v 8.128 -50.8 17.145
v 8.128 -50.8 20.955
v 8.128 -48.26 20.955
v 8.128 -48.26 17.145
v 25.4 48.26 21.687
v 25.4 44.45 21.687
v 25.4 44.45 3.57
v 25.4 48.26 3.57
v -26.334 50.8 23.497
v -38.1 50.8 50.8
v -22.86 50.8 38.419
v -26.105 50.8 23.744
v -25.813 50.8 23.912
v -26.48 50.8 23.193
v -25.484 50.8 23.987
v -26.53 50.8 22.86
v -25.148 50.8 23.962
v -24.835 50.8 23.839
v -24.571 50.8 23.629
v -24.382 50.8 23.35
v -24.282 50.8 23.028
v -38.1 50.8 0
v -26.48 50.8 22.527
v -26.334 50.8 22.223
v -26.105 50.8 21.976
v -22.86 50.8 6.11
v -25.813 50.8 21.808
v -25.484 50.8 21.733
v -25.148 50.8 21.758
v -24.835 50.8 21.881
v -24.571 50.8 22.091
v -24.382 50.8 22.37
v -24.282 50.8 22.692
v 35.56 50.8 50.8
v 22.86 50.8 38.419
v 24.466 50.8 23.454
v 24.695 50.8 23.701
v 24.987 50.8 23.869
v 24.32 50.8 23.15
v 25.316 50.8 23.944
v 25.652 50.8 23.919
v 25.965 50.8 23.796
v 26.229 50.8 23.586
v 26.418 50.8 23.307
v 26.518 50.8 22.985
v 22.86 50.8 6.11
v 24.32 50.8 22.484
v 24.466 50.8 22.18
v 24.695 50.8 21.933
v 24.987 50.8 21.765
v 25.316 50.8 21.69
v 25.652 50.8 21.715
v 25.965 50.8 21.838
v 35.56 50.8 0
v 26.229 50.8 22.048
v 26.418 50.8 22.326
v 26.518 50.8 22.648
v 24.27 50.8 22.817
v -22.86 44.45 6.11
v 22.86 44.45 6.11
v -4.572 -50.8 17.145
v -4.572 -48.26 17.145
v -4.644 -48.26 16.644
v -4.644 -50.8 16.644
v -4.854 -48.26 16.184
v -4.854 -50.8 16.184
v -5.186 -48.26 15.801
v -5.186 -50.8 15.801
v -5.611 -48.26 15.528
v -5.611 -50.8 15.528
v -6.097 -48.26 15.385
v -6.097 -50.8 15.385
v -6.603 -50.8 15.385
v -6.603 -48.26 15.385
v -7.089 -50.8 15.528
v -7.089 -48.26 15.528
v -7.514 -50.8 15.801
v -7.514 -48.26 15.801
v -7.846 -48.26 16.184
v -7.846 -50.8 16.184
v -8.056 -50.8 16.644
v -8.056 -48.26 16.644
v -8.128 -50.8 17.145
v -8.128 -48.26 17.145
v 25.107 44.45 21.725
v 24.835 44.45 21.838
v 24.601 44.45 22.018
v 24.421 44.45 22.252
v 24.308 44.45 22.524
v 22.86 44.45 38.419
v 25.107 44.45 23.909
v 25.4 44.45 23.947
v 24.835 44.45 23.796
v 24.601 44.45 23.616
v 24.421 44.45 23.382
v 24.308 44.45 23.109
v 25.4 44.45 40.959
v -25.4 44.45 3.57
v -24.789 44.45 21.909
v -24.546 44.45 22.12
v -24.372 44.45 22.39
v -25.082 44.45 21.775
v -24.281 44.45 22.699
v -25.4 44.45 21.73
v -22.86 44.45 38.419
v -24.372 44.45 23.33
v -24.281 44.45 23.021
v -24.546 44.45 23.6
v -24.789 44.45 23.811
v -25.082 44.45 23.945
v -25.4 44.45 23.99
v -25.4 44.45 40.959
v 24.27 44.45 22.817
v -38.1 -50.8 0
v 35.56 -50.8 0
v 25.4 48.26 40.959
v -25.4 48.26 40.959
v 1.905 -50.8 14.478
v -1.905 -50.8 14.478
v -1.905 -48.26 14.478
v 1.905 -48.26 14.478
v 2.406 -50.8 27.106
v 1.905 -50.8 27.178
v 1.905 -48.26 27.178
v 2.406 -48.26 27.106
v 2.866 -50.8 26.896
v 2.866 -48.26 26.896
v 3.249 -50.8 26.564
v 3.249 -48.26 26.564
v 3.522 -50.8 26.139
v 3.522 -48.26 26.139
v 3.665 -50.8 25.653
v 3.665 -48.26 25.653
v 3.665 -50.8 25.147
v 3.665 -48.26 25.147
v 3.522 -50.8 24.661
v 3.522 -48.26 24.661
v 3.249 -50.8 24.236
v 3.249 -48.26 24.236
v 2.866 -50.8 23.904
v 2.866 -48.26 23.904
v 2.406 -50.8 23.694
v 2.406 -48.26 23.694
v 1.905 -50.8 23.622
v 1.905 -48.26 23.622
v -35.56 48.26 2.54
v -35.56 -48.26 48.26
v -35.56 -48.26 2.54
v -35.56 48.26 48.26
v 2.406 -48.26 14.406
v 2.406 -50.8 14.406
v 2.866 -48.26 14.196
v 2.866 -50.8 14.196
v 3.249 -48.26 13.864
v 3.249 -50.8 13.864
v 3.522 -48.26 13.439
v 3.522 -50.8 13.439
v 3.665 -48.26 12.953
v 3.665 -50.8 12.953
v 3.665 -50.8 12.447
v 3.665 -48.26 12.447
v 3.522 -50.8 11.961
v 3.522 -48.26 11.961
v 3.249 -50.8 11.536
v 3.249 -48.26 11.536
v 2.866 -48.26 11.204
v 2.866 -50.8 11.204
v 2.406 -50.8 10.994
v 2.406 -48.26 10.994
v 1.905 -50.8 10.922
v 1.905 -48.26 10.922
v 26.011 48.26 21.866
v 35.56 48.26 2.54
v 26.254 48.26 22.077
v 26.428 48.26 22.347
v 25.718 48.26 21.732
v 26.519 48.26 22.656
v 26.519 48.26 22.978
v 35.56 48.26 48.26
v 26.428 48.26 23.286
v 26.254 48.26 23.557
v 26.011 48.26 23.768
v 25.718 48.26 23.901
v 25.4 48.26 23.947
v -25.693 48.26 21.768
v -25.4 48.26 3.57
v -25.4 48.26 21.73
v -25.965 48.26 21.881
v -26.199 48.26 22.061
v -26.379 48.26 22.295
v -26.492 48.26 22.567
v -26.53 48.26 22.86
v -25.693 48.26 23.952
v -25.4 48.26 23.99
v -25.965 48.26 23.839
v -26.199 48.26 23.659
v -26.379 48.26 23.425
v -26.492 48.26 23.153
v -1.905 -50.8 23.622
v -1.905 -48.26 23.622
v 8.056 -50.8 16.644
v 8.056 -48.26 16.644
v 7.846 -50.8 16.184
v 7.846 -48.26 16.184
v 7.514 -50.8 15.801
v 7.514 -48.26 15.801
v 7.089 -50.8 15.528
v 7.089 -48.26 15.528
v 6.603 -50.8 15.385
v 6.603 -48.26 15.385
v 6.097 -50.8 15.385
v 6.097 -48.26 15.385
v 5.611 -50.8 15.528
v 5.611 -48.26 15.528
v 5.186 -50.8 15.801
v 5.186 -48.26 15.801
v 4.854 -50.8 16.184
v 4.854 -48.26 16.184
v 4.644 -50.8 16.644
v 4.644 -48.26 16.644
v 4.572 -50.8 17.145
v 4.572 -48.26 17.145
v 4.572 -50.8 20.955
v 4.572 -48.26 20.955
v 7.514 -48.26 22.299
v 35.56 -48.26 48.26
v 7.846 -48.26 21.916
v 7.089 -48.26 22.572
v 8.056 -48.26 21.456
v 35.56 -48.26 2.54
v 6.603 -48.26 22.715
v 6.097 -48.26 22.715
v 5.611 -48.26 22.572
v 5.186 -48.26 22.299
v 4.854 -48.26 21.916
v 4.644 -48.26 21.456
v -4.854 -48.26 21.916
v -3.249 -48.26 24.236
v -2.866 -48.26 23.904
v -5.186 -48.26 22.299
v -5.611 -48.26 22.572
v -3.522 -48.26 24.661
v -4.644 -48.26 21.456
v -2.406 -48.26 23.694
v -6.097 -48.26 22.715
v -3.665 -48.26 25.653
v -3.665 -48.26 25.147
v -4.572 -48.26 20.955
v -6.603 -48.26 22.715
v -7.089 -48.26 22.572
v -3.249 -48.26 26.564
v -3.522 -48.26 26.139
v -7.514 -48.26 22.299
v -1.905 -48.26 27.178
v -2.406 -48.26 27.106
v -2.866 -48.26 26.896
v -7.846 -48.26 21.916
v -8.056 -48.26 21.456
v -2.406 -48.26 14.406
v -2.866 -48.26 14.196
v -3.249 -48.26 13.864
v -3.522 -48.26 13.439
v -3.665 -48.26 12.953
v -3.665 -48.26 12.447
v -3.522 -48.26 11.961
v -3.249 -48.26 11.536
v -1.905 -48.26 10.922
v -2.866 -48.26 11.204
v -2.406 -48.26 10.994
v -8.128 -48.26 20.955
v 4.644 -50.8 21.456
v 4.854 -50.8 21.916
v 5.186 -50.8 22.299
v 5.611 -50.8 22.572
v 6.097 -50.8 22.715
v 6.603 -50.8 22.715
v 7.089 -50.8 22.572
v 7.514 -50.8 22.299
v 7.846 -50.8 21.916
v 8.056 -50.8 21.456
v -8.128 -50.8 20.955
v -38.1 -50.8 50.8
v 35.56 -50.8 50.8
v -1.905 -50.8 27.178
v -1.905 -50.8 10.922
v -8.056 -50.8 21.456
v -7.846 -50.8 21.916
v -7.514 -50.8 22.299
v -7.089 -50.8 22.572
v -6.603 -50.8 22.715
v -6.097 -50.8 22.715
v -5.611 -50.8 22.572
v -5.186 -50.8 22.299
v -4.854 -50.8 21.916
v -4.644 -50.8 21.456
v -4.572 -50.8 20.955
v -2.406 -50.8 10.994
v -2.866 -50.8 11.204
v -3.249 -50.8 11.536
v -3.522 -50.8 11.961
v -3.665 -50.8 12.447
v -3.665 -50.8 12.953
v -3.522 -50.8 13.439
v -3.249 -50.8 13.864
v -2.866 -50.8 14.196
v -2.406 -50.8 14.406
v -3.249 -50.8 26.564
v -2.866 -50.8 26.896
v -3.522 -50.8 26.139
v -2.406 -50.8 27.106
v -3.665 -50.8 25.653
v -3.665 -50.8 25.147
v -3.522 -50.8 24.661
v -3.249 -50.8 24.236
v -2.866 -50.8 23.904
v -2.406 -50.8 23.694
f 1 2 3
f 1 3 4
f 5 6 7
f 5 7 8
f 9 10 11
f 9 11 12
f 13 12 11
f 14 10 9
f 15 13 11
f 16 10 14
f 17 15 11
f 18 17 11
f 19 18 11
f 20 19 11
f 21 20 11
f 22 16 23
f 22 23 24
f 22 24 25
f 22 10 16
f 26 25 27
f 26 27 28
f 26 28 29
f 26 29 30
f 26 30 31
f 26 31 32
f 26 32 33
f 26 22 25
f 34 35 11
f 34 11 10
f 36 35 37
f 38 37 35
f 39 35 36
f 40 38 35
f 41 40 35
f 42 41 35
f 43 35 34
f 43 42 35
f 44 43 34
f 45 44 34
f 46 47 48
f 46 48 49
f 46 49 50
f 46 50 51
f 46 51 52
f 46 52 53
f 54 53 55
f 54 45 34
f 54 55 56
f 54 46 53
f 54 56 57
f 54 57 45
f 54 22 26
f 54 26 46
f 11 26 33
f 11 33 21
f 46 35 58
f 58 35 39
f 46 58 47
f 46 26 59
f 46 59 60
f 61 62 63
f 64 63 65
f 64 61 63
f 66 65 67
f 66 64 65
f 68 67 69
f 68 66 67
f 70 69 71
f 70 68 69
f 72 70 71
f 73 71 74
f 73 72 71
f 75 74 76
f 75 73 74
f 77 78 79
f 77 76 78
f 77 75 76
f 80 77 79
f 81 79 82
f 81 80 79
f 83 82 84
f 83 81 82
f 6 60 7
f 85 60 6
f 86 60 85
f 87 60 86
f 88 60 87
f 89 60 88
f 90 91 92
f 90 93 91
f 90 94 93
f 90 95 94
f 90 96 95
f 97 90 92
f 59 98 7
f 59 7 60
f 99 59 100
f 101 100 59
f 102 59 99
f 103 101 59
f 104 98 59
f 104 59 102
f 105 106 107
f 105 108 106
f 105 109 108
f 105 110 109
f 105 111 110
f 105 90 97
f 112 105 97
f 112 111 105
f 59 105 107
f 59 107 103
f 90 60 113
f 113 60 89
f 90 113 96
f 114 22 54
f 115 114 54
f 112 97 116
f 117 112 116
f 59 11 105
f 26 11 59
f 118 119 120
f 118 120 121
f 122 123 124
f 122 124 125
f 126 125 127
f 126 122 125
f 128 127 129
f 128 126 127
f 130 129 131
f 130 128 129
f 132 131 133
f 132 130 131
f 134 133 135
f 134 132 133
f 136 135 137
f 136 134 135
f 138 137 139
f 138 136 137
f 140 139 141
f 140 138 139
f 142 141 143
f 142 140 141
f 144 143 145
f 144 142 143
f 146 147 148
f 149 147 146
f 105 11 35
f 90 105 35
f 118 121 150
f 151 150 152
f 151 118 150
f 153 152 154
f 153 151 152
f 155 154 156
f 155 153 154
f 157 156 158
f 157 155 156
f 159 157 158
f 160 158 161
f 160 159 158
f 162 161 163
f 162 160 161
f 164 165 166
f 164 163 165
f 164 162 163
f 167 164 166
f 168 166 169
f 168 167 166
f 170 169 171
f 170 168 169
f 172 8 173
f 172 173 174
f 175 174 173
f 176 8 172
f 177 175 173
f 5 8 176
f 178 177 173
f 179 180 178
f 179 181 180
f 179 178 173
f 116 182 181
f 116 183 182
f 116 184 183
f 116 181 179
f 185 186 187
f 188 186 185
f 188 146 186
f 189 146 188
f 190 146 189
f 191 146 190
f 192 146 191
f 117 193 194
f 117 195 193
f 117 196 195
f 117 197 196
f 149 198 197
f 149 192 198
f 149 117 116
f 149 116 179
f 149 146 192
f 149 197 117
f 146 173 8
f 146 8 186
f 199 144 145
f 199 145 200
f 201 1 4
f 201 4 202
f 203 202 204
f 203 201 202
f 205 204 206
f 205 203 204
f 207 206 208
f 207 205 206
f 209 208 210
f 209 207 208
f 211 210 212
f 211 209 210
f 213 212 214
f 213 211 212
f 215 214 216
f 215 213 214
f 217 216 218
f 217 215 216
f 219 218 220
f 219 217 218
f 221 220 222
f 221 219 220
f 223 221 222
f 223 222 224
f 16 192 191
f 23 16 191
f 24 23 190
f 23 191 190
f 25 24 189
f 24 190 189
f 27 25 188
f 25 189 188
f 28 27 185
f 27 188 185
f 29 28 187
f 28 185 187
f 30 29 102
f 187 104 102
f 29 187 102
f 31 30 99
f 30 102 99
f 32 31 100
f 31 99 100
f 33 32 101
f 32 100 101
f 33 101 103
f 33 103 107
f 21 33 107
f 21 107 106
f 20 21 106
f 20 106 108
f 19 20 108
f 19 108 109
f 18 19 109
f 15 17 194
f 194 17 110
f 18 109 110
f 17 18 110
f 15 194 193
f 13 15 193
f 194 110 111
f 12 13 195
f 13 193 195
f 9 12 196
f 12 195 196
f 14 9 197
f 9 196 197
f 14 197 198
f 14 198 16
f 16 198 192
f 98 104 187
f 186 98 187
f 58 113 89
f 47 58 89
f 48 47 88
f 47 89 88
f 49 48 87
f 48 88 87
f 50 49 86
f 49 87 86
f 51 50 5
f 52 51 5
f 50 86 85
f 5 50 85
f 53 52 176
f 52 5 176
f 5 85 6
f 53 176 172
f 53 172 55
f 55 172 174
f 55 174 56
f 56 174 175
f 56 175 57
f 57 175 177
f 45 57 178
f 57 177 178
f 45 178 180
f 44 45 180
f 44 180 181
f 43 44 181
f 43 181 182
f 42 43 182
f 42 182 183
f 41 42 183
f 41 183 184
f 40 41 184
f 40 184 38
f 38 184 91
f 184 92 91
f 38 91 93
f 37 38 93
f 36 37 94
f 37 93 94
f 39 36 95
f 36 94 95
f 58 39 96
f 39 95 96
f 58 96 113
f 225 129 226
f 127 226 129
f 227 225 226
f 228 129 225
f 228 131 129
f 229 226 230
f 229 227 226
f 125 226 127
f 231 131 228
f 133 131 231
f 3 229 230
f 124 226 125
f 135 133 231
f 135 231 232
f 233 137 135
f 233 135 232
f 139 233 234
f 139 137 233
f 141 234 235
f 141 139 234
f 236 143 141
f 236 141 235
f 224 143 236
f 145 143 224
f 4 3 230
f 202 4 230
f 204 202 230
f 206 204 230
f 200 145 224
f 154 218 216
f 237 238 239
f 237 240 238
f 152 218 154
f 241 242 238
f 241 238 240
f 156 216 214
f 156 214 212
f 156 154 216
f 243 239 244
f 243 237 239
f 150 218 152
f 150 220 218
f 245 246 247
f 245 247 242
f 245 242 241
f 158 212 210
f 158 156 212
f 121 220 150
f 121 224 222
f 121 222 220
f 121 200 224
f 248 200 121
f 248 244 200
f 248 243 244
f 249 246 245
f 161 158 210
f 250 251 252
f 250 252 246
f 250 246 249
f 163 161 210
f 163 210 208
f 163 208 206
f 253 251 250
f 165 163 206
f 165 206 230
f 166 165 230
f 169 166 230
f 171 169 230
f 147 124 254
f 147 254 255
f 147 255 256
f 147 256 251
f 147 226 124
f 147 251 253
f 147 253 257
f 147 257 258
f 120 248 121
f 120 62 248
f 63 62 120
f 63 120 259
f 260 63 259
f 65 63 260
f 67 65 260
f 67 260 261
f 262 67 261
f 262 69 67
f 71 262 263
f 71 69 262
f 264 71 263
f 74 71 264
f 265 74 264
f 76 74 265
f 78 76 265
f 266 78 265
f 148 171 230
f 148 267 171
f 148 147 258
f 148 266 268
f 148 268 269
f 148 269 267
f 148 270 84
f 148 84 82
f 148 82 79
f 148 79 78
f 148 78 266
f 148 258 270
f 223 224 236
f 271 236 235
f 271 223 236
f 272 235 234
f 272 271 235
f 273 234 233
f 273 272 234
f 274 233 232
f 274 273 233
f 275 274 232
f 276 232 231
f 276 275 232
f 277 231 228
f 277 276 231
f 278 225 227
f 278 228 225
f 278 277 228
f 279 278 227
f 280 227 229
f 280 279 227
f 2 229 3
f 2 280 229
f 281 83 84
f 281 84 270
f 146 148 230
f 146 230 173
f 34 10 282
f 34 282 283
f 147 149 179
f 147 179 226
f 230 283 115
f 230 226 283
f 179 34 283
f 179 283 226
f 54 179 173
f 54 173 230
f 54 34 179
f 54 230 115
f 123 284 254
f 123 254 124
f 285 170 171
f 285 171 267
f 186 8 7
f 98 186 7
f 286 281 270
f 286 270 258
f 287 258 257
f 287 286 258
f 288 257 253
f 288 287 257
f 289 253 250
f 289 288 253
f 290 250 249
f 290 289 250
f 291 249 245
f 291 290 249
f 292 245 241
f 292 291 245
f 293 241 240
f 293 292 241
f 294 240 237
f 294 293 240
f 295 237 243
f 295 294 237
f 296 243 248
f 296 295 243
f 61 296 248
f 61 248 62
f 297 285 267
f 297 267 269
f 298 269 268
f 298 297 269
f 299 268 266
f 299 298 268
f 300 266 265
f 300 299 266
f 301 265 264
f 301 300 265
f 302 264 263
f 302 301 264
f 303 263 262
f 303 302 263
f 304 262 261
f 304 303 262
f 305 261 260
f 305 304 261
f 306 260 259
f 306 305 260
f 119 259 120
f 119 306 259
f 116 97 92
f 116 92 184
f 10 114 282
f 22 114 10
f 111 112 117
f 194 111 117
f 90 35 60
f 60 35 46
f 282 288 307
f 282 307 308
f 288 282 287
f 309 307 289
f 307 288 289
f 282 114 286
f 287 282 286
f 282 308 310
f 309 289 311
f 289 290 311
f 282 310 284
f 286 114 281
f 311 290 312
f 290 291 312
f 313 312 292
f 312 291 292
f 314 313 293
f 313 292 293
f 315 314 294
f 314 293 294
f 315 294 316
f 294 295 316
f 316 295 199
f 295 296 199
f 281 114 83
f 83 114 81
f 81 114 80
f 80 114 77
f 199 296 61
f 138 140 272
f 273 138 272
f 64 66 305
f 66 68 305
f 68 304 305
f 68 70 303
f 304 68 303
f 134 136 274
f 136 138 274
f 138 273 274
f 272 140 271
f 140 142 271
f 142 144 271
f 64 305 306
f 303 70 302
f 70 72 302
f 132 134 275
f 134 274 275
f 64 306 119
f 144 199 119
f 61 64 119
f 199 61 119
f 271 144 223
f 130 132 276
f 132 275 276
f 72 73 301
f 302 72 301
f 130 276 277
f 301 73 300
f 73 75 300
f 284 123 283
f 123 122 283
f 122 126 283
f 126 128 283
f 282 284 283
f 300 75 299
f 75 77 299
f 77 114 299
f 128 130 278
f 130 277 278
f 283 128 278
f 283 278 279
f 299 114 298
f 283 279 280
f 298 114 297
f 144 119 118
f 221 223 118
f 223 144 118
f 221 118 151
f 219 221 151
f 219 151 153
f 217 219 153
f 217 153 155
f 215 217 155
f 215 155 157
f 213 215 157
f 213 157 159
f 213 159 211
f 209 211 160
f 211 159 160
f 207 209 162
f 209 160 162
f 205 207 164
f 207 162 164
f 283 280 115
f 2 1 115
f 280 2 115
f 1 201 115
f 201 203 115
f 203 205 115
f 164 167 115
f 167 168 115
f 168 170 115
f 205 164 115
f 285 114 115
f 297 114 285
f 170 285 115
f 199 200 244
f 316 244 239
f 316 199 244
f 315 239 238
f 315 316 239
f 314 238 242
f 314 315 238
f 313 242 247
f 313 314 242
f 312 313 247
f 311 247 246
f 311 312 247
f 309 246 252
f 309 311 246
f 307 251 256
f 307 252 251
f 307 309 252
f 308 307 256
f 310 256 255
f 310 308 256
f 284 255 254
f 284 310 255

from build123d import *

# Parameters (mm, degrees)
SKETCH1_W                    = 76.2
SKETCH1_H                    = 101.6
BODY_DEPTH                   = 50.8
SKETCH2_W                    = 45.72
SKETCH2_H                    = 32.3088
CAMERA_HOLE_DEPTH            = 6.35
HOLLOW_START                 = -35.56
HOLLOW_DEPTH                 = 71.12
HOLLOW_2_OUTLINE_W           = 3.81
HOLLOW_2_OUTLINE_H           = 37.3888
HOLLOW_2_DEPTH               = 10.16
HOLLOW_START_2               = 25.4
HOLLOW_3_OUTLINE_W           = 3.81
HOLLOW_3_OUTLINE_H           = 37.3888
HOLLOW_3_DEPTH               = 10.16
SINGLE_BUTTON_LEG_HOLE_REACH = 121.812
ALL_BUTTON_HOLES_COUNT       = 4
SKETCH5_W                    = 50.8
SKETCH5_H                    = 101.6
LET_FOLKS_SEE_IN_DEPTH       = 2.54
F_4_40_TAPPED_HOLE1_D        = 2.2606
F_4_40_TAPPED_HOLE1_DEPTH    = 7.62
F_4_40_TAPPED_HOLE1_TIP      = 0.679152758


# Read off the part's stored shape, not the designer's step: hollow
with BuildPart() as part:
    # Sketch1 → body (new body)
    with BuildSketch(Plane.XY):
        Rectangle(SKETCH1_W, SKETCH1_H)
    extrude(amount=BODY_DEPTH)

    # Sketch2 → camera hole (cut)
    with BuildSketch(Plane(origin=(0, 50.8, 0), x_dir=(1, 0, 0), z_dir=(0, 1, 0))):
        with Locations((0, -22.264701422)):
            Rectangle(SKETCH2_W, SKETCH2_H)
    extrude(amount=-CAMERA_HOLE_DEPTH, mode=Mode.SUBTRACT)

    # hollow outline → hollow (cut)
    with BuildSketch(Plane.YZ.offset(HOLLOW_START)):
        Polygon((48.26, 40.959101422), (48.26, 48.26), (-48.26, 48.26), (-48.26, 2.54), (48.26, 2.54), (48.26, 3.570301422), (44.45, 3.570301422), (44.45, 40.959101422), align=None)
    extrude(amount=HOLLOW_DEPTH, mode=Mode.SUBTRACT)

    # hollow 2 outline → hollow 2 (cut)
    with BuildSketch(Plane.YZ.offset(HOLLOW_START)):
        with Locations((46.355, 22.264701422)):
            Rectangle(HOLLOW_2_OUTLINE_W, HOLLOW_2_OUTLINE_H)
    extrude(amount=HOLLOW_2_DEPTH, mode=Mode.SUBTRACT)

    # hollow 3 outline → hollow 3 (cut)
    with BuildSketch(Plane.YZ.offset(HOLLOW_START_2)):
        with Locations((46.355, 22.264701422)):
            Rectangle(HOLLOW_3_OUTLINE_W, HOLLOW_3_OUTLINE_H)
    extrude(amount=HOLLOW_3_DEPTH, mode=Mode.SUBTRACT)

    # Sketch4 → single button leg hole (cut, up to next)
    with BuildSketch(Plane.XZ.offset(50.8), mode=Mode.PRIVATE) as single_button_leg_hole_sk1:
        with BuildLine():
            Line((8.128, 20.955), (8.128, 17.145))
            ThreePointArc((8.128, 17.145), (6.35, 15.367), (4.572, 17.145))
            Line((4.572, 17.145), (4.572, 20.955))
            ThreePointArc((4.572, 20.955), (6.35, 22.733), (8.128, 20.955))
        make_face()
    single_button_leg_hole_tool1 = extrude(single_button_leg_hole_sk1.sketch, amount=-SINGLE_BUTTON_LEG_HOLE_REACH, mode=Mode.PRIVATE) & part.part
    single_button_leg_hole = single_button_leg_hole_tool1.solids().sort_by_distance((6.35, -50.8, 19.05))[0]
    add(single_button_leg_hole, mode=Mode.SUBTRACT)

    # all button holes: single button leg hole ×4 about axis
    all_button_holes_axis = Axis((0, 0, 19.05), (0, 1, 0))
    for i in range(1, ALL_BUTTON_HOLES_COUNT):
        add(single_button_leg_hole.rotate(all_button_holes_axis, i * 360 / ALL_BUTTON_HOLES_COUNT), mode=Mode.SUBTRACT)

    # Sketch5 → let folks see in (cut)
    with BuildSketch(Plane(origin=(38.1, 0, 0), x_dir=(0, 0, -1), z_dir=(1, 0, 0))):
        with Locations((-25.4, 0)):
            Rectangle(SKETCH5_W, SKETCH5_H)
    extrude(amount=-LET_FOLKS_SEE_IN_DEPTH, mode=Mode.SUBTRACT)

    # #4-40 Tapped Hole1
    with Locations(Plane(origin=(0, 50.8, 0), x_dir=(1, 0, 0), z_dir=(0, 1, 0))):
        with Locations((-25.4, -22.86), (25.4, -22.816885961)):
            Hole(F_4_40_TAPPED_HOLE1_D / 2, depth=F_4_40_TAPPED_HOLE1_DEPTH)
            with Locations((0, 0, -(F_4_40_TAPPED_HOLE1_DEPTH + F_4_40_TAPPED_HOLE1_TIP / 2))):  # 118° drill point
                Cone(0, F_4_40_TAPPED_HOLE1_D / 2, F_4_40_TAPPED_HOLE1_TIP, mode=Mode.SUBTRACT)


solid = part.part
